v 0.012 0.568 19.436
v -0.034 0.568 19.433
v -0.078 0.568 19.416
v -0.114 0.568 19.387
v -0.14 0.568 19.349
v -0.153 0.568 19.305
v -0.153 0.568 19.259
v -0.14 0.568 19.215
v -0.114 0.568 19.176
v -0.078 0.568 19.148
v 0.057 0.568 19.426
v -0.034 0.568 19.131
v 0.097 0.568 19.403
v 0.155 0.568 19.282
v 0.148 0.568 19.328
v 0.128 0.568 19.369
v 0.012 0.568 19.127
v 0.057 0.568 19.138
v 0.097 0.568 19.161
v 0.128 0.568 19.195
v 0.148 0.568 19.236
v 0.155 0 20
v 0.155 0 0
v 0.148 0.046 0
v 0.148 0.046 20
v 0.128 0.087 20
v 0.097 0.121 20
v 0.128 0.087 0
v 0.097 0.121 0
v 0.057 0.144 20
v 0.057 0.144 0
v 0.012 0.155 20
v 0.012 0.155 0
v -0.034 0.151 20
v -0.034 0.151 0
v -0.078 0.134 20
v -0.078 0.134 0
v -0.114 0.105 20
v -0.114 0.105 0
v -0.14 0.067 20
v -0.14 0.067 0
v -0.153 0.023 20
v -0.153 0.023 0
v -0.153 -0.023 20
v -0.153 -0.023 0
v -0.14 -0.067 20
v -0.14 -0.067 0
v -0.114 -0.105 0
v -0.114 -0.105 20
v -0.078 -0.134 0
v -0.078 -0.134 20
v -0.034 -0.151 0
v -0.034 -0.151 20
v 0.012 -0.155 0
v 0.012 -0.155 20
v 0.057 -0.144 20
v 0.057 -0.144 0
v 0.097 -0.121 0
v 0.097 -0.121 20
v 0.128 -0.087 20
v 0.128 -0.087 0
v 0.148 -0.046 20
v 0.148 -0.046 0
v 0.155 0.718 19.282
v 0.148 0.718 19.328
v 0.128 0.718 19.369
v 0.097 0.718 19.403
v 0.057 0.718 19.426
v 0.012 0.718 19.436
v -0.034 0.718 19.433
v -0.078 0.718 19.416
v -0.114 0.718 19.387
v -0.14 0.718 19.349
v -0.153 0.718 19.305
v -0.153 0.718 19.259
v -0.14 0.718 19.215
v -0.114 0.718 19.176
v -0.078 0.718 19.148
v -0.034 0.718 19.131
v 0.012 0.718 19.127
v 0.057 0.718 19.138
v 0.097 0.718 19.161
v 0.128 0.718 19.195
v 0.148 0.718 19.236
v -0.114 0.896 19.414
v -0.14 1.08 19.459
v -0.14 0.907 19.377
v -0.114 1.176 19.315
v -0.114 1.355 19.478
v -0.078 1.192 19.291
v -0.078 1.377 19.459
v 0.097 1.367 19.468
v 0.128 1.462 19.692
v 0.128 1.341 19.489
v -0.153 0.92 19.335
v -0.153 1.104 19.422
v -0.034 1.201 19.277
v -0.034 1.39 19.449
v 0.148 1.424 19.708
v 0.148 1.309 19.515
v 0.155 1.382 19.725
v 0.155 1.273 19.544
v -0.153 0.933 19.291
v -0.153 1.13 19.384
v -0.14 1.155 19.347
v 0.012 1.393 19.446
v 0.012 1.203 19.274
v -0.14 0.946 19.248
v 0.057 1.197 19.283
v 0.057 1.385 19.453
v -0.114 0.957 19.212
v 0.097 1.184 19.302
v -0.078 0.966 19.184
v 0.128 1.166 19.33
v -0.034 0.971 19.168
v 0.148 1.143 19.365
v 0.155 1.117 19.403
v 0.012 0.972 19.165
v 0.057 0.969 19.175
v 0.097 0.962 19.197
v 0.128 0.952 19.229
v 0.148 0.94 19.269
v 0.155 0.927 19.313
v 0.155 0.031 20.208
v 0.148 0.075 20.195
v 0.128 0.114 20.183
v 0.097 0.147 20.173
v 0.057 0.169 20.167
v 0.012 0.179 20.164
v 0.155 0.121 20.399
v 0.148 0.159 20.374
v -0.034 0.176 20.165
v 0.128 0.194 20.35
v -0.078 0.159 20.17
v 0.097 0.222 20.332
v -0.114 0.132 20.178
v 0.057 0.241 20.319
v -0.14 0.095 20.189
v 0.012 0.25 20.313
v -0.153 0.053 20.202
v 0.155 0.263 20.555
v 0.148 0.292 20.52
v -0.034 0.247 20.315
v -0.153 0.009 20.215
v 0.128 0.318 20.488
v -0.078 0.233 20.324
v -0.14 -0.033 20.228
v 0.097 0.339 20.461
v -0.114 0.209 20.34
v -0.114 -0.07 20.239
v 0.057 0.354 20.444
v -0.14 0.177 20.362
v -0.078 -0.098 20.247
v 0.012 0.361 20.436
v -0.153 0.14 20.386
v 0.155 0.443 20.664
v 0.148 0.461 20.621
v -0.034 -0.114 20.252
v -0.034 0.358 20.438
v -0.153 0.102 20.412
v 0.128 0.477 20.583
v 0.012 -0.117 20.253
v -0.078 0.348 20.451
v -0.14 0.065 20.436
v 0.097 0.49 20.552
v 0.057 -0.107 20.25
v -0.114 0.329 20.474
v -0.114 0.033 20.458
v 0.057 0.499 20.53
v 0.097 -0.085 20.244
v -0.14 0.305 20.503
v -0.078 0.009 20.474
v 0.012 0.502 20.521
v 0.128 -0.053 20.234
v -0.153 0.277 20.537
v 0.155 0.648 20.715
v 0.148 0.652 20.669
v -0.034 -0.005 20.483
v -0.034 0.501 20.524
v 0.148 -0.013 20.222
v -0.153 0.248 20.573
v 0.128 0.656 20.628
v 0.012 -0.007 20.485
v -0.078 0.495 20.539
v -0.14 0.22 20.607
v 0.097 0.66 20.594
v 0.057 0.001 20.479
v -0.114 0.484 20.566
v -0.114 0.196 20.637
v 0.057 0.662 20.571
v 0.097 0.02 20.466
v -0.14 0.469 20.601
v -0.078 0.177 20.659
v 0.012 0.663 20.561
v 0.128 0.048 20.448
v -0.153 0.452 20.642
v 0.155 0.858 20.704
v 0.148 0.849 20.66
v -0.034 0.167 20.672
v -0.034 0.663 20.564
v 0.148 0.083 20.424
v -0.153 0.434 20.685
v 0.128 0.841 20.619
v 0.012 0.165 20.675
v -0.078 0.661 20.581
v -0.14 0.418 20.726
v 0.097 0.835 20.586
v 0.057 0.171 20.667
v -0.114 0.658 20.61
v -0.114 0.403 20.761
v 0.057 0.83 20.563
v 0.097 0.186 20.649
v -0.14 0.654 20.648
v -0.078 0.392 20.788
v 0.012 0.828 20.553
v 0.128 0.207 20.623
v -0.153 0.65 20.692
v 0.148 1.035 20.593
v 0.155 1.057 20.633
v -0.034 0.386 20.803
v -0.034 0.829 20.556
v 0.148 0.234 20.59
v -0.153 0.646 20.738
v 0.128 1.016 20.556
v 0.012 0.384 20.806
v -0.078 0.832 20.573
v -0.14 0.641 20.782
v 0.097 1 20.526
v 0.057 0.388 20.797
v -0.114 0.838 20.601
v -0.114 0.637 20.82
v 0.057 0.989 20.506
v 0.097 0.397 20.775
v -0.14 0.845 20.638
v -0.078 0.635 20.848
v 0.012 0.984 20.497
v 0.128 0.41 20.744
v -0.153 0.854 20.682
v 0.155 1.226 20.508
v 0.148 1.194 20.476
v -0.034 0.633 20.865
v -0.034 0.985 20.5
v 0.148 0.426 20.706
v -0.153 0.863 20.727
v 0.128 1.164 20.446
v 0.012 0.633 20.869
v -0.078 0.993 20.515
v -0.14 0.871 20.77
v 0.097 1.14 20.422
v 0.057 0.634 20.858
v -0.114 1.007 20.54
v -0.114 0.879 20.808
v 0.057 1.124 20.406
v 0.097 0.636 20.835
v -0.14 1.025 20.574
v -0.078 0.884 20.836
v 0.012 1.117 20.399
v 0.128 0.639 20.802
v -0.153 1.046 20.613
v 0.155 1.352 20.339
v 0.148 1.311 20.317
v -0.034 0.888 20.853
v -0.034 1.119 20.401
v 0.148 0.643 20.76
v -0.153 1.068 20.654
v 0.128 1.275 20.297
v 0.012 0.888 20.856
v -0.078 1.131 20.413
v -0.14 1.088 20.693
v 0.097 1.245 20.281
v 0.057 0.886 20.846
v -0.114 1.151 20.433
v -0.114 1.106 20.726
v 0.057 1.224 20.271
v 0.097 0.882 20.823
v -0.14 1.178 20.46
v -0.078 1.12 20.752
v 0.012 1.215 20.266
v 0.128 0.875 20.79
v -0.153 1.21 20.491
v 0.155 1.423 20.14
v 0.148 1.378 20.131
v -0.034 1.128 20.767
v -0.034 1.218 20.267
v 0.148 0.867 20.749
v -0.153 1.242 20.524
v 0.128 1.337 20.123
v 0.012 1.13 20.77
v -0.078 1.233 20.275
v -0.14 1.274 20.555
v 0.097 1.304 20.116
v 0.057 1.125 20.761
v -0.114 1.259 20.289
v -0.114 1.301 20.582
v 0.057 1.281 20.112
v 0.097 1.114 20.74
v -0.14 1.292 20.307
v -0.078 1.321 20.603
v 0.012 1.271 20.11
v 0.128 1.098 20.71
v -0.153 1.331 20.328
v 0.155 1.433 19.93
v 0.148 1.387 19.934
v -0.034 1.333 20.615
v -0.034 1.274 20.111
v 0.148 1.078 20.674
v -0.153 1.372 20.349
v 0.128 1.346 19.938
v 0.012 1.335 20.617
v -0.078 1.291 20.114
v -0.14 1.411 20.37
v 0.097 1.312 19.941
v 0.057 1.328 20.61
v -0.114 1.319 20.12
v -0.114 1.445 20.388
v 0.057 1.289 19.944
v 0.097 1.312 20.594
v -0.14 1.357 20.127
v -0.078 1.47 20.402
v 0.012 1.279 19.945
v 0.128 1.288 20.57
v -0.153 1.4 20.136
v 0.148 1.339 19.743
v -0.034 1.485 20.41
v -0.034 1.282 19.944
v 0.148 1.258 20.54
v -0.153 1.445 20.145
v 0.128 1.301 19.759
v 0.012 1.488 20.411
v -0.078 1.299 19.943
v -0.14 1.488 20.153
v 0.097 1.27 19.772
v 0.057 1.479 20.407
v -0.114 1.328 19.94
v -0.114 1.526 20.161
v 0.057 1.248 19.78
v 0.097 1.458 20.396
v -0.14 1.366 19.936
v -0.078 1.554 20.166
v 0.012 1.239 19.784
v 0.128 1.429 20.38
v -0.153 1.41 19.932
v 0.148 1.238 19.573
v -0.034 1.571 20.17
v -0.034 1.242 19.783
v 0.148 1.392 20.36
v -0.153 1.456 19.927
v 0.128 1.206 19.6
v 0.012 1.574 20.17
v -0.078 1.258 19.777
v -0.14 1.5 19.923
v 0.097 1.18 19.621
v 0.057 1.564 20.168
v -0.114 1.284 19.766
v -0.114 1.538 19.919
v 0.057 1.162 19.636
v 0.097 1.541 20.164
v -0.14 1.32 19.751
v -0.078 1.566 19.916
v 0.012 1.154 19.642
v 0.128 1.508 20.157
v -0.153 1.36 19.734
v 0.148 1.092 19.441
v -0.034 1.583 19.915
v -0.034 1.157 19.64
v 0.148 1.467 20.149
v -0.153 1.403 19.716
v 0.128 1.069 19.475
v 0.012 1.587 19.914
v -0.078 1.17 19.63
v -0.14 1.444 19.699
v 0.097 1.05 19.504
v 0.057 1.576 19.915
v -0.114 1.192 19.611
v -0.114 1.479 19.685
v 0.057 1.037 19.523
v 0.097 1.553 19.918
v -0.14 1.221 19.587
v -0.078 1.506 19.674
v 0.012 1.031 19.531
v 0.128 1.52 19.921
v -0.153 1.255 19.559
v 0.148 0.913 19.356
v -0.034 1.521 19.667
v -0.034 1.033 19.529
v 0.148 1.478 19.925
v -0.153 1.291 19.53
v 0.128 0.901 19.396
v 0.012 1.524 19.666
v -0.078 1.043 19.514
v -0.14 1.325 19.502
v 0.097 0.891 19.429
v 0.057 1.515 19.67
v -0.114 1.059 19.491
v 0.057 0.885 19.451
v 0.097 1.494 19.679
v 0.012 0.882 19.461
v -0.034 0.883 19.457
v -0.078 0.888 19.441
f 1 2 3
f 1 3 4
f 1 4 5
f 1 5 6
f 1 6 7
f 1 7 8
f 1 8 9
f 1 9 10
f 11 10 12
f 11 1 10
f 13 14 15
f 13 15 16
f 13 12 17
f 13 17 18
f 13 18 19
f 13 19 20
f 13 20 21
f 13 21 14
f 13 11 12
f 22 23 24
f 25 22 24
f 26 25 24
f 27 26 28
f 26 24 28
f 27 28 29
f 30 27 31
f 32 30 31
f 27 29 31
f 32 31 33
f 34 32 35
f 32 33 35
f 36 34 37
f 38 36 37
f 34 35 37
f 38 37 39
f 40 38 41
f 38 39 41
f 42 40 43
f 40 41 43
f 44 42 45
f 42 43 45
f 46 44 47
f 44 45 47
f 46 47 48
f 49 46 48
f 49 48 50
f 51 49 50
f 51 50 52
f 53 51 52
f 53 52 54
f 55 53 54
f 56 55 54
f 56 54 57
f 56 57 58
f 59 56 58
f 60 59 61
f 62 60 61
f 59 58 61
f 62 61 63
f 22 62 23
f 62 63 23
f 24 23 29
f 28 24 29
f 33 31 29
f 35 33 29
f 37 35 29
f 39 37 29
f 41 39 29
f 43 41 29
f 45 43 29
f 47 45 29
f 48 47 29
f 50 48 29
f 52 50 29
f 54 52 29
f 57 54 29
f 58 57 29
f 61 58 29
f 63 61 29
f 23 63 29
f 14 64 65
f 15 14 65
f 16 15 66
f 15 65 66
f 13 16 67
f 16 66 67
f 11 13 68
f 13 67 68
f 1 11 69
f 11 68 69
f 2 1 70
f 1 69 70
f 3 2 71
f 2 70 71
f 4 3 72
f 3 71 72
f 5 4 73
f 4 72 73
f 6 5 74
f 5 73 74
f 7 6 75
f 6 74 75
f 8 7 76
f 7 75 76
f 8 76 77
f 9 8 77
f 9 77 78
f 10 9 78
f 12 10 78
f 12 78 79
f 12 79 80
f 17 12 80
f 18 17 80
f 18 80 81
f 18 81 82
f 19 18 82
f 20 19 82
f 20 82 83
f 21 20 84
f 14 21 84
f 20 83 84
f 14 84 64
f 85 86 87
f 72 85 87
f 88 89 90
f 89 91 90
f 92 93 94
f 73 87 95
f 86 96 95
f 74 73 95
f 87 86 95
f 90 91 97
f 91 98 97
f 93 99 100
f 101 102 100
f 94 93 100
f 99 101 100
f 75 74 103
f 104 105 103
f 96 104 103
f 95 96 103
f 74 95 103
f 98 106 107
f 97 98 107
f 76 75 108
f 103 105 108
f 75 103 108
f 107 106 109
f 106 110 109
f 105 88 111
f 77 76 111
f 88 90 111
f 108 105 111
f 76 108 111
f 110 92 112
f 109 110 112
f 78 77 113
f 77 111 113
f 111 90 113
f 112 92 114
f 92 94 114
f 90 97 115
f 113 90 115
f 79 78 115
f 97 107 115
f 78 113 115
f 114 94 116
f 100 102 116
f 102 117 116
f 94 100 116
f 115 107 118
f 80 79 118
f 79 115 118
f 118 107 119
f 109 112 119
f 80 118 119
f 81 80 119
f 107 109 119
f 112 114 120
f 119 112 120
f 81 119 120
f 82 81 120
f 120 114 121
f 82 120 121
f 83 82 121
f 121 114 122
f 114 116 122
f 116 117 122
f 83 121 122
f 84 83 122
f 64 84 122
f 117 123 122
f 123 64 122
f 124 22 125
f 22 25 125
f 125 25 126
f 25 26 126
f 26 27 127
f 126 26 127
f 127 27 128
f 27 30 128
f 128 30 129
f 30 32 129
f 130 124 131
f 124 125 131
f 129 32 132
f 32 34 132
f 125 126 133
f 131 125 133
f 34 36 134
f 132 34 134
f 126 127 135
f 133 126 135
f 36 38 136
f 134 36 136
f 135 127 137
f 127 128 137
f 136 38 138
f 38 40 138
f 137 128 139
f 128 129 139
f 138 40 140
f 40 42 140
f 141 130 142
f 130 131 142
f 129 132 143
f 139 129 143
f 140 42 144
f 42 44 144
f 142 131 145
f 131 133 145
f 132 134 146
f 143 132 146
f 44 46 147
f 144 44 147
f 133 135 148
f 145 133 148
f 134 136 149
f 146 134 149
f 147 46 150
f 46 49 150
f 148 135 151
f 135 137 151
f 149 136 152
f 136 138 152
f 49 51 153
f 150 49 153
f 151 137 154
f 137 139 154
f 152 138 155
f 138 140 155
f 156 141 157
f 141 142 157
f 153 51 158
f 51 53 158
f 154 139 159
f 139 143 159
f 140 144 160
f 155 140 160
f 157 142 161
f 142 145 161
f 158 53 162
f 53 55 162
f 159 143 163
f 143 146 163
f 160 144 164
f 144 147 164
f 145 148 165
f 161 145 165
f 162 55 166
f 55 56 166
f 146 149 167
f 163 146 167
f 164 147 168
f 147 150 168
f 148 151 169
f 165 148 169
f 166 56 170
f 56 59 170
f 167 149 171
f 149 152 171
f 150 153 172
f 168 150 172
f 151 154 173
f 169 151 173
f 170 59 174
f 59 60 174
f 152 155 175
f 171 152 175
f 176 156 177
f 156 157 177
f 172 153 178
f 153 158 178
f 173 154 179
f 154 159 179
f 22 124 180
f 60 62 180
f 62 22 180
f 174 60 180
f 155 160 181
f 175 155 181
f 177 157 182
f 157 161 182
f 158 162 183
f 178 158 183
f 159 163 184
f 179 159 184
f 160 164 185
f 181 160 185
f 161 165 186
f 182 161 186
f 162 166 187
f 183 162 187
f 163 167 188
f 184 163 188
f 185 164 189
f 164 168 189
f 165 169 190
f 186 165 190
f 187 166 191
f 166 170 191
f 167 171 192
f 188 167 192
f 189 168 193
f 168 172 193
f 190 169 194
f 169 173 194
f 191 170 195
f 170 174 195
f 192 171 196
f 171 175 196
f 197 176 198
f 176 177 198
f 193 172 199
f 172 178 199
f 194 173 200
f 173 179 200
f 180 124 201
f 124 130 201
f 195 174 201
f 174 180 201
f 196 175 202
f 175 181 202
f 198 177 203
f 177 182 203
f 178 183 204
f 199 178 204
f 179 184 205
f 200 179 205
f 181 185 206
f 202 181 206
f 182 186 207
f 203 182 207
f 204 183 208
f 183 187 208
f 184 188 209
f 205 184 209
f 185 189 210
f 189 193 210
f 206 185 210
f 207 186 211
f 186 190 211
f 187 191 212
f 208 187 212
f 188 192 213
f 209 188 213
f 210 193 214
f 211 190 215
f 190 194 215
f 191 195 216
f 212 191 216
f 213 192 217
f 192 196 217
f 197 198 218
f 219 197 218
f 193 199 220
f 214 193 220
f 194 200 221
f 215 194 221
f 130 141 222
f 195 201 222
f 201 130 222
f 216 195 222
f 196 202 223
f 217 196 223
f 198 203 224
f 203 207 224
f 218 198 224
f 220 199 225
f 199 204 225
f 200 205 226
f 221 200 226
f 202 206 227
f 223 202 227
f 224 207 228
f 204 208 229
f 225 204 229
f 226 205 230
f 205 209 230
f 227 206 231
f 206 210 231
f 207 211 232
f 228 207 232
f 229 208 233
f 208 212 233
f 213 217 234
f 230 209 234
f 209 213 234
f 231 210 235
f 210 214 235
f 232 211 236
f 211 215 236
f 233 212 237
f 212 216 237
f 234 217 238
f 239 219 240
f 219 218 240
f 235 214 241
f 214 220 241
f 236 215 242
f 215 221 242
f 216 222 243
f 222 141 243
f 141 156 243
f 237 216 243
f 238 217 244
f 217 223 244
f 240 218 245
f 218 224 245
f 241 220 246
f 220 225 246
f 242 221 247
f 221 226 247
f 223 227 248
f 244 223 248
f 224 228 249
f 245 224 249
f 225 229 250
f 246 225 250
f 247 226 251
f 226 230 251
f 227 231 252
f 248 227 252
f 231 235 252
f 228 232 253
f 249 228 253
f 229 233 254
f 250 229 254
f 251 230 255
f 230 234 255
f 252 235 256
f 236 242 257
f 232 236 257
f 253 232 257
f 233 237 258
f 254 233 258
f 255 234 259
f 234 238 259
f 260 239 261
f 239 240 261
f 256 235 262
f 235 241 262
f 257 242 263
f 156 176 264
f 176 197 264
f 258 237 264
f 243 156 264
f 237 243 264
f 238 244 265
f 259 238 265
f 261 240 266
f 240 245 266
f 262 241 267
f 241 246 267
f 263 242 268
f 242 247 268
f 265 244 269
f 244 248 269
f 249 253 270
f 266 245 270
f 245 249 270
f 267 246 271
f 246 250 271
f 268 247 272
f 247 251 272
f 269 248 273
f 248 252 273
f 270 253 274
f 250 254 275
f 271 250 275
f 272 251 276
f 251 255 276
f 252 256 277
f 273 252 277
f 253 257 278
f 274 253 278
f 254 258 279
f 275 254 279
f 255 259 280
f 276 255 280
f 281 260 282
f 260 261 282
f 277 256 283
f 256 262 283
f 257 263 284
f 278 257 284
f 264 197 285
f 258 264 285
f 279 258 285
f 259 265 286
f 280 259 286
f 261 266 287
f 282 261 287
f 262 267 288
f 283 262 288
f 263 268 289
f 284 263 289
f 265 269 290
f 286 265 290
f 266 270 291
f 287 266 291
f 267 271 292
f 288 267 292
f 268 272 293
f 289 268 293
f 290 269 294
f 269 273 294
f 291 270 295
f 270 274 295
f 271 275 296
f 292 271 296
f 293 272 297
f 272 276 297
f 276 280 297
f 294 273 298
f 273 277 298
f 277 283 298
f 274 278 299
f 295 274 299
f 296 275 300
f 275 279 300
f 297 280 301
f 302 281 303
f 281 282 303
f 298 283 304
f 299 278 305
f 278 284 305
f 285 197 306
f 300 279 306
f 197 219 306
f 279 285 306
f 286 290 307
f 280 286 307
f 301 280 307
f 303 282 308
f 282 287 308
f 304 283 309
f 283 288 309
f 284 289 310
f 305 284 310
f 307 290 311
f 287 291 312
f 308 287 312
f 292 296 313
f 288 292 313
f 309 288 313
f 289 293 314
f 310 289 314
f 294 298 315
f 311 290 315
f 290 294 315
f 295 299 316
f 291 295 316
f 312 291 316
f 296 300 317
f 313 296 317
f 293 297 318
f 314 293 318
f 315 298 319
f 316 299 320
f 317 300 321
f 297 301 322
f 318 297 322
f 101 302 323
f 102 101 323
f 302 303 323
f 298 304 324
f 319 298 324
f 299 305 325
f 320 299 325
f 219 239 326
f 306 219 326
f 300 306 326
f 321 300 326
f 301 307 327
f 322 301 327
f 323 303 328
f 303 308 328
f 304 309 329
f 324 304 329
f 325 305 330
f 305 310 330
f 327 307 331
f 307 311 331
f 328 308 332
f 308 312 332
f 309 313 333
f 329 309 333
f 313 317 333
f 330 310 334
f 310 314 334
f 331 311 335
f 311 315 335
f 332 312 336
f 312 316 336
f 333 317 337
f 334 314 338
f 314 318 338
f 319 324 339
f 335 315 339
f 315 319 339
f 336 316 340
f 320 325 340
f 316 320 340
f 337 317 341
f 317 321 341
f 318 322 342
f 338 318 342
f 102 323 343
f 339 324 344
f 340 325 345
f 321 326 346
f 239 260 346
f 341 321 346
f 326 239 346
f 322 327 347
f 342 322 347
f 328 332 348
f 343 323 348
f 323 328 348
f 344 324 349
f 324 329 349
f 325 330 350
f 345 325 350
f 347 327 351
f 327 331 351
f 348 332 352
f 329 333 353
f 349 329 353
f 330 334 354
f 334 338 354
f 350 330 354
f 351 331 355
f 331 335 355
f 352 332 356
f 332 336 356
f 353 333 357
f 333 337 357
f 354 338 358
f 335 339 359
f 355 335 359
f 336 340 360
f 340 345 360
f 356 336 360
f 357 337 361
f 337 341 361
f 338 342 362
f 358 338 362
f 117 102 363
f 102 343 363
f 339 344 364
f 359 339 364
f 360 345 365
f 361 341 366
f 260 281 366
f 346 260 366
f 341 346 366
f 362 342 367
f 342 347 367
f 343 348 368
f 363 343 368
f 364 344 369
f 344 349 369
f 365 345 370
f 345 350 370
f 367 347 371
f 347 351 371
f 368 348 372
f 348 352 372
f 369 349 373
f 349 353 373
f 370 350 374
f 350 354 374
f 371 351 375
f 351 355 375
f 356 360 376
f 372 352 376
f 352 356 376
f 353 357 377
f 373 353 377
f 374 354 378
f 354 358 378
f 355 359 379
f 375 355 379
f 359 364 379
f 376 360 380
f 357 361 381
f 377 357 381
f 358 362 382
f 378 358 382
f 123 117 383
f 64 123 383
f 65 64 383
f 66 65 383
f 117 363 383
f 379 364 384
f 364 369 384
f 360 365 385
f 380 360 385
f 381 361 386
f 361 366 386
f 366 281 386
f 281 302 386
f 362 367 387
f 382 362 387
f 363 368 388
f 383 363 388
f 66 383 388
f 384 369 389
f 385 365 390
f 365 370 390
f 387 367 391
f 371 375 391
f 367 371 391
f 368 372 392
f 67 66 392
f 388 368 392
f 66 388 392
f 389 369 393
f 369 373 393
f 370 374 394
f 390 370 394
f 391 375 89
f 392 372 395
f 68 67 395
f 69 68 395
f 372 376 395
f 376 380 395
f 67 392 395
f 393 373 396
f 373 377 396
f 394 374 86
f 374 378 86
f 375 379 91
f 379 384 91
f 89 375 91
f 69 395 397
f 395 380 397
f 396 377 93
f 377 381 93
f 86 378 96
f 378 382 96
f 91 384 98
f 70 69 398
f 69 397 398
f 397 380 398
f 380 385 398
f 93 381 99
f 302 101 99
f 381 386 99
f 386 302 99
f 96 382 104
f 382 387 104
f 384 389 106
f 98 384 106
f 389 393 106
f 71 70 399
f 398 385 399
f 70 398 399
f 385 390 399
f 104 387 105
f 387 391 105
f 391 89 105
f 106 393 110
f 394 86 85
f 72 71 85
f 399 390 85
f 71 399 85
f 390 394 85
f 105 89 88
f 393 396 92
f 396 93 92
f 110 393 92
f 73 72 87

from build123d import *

# Parameters (mm, degrees)
F0_R     = 0.155
F1_DEPTH = 20
F2_R     = 0.155
F3_ANGLE = 270
F4_R     = 0.155
F5_DEPTH = 0.15


with BuildPart() as f1:
    # F0 (on Top) → F1 (new body)
    with BuildSketch(Plane.XY):
        Circle(F0_R)
    extrude(amount=F1_DEPTH)

    # F2 (on face) → F3 (revolve)
    with BuildSketch(Plane.XY.offset(20)):
        Circle(F2_R)
    revolve(axis=Axis((0.0432368064, 0.718167399, 20), (-1, 0, 0)), revolution_arc=F3_ANGLE)

    # F4 (on face) → F5 (join)
    with BuildSketch(Plane.XZ.offset(-0.718167399)):
        with Locations((0, 19.281832601)):
            Circle(F4_R)
    extrude(amount=F5_DEPTH)


solid = f1.part
